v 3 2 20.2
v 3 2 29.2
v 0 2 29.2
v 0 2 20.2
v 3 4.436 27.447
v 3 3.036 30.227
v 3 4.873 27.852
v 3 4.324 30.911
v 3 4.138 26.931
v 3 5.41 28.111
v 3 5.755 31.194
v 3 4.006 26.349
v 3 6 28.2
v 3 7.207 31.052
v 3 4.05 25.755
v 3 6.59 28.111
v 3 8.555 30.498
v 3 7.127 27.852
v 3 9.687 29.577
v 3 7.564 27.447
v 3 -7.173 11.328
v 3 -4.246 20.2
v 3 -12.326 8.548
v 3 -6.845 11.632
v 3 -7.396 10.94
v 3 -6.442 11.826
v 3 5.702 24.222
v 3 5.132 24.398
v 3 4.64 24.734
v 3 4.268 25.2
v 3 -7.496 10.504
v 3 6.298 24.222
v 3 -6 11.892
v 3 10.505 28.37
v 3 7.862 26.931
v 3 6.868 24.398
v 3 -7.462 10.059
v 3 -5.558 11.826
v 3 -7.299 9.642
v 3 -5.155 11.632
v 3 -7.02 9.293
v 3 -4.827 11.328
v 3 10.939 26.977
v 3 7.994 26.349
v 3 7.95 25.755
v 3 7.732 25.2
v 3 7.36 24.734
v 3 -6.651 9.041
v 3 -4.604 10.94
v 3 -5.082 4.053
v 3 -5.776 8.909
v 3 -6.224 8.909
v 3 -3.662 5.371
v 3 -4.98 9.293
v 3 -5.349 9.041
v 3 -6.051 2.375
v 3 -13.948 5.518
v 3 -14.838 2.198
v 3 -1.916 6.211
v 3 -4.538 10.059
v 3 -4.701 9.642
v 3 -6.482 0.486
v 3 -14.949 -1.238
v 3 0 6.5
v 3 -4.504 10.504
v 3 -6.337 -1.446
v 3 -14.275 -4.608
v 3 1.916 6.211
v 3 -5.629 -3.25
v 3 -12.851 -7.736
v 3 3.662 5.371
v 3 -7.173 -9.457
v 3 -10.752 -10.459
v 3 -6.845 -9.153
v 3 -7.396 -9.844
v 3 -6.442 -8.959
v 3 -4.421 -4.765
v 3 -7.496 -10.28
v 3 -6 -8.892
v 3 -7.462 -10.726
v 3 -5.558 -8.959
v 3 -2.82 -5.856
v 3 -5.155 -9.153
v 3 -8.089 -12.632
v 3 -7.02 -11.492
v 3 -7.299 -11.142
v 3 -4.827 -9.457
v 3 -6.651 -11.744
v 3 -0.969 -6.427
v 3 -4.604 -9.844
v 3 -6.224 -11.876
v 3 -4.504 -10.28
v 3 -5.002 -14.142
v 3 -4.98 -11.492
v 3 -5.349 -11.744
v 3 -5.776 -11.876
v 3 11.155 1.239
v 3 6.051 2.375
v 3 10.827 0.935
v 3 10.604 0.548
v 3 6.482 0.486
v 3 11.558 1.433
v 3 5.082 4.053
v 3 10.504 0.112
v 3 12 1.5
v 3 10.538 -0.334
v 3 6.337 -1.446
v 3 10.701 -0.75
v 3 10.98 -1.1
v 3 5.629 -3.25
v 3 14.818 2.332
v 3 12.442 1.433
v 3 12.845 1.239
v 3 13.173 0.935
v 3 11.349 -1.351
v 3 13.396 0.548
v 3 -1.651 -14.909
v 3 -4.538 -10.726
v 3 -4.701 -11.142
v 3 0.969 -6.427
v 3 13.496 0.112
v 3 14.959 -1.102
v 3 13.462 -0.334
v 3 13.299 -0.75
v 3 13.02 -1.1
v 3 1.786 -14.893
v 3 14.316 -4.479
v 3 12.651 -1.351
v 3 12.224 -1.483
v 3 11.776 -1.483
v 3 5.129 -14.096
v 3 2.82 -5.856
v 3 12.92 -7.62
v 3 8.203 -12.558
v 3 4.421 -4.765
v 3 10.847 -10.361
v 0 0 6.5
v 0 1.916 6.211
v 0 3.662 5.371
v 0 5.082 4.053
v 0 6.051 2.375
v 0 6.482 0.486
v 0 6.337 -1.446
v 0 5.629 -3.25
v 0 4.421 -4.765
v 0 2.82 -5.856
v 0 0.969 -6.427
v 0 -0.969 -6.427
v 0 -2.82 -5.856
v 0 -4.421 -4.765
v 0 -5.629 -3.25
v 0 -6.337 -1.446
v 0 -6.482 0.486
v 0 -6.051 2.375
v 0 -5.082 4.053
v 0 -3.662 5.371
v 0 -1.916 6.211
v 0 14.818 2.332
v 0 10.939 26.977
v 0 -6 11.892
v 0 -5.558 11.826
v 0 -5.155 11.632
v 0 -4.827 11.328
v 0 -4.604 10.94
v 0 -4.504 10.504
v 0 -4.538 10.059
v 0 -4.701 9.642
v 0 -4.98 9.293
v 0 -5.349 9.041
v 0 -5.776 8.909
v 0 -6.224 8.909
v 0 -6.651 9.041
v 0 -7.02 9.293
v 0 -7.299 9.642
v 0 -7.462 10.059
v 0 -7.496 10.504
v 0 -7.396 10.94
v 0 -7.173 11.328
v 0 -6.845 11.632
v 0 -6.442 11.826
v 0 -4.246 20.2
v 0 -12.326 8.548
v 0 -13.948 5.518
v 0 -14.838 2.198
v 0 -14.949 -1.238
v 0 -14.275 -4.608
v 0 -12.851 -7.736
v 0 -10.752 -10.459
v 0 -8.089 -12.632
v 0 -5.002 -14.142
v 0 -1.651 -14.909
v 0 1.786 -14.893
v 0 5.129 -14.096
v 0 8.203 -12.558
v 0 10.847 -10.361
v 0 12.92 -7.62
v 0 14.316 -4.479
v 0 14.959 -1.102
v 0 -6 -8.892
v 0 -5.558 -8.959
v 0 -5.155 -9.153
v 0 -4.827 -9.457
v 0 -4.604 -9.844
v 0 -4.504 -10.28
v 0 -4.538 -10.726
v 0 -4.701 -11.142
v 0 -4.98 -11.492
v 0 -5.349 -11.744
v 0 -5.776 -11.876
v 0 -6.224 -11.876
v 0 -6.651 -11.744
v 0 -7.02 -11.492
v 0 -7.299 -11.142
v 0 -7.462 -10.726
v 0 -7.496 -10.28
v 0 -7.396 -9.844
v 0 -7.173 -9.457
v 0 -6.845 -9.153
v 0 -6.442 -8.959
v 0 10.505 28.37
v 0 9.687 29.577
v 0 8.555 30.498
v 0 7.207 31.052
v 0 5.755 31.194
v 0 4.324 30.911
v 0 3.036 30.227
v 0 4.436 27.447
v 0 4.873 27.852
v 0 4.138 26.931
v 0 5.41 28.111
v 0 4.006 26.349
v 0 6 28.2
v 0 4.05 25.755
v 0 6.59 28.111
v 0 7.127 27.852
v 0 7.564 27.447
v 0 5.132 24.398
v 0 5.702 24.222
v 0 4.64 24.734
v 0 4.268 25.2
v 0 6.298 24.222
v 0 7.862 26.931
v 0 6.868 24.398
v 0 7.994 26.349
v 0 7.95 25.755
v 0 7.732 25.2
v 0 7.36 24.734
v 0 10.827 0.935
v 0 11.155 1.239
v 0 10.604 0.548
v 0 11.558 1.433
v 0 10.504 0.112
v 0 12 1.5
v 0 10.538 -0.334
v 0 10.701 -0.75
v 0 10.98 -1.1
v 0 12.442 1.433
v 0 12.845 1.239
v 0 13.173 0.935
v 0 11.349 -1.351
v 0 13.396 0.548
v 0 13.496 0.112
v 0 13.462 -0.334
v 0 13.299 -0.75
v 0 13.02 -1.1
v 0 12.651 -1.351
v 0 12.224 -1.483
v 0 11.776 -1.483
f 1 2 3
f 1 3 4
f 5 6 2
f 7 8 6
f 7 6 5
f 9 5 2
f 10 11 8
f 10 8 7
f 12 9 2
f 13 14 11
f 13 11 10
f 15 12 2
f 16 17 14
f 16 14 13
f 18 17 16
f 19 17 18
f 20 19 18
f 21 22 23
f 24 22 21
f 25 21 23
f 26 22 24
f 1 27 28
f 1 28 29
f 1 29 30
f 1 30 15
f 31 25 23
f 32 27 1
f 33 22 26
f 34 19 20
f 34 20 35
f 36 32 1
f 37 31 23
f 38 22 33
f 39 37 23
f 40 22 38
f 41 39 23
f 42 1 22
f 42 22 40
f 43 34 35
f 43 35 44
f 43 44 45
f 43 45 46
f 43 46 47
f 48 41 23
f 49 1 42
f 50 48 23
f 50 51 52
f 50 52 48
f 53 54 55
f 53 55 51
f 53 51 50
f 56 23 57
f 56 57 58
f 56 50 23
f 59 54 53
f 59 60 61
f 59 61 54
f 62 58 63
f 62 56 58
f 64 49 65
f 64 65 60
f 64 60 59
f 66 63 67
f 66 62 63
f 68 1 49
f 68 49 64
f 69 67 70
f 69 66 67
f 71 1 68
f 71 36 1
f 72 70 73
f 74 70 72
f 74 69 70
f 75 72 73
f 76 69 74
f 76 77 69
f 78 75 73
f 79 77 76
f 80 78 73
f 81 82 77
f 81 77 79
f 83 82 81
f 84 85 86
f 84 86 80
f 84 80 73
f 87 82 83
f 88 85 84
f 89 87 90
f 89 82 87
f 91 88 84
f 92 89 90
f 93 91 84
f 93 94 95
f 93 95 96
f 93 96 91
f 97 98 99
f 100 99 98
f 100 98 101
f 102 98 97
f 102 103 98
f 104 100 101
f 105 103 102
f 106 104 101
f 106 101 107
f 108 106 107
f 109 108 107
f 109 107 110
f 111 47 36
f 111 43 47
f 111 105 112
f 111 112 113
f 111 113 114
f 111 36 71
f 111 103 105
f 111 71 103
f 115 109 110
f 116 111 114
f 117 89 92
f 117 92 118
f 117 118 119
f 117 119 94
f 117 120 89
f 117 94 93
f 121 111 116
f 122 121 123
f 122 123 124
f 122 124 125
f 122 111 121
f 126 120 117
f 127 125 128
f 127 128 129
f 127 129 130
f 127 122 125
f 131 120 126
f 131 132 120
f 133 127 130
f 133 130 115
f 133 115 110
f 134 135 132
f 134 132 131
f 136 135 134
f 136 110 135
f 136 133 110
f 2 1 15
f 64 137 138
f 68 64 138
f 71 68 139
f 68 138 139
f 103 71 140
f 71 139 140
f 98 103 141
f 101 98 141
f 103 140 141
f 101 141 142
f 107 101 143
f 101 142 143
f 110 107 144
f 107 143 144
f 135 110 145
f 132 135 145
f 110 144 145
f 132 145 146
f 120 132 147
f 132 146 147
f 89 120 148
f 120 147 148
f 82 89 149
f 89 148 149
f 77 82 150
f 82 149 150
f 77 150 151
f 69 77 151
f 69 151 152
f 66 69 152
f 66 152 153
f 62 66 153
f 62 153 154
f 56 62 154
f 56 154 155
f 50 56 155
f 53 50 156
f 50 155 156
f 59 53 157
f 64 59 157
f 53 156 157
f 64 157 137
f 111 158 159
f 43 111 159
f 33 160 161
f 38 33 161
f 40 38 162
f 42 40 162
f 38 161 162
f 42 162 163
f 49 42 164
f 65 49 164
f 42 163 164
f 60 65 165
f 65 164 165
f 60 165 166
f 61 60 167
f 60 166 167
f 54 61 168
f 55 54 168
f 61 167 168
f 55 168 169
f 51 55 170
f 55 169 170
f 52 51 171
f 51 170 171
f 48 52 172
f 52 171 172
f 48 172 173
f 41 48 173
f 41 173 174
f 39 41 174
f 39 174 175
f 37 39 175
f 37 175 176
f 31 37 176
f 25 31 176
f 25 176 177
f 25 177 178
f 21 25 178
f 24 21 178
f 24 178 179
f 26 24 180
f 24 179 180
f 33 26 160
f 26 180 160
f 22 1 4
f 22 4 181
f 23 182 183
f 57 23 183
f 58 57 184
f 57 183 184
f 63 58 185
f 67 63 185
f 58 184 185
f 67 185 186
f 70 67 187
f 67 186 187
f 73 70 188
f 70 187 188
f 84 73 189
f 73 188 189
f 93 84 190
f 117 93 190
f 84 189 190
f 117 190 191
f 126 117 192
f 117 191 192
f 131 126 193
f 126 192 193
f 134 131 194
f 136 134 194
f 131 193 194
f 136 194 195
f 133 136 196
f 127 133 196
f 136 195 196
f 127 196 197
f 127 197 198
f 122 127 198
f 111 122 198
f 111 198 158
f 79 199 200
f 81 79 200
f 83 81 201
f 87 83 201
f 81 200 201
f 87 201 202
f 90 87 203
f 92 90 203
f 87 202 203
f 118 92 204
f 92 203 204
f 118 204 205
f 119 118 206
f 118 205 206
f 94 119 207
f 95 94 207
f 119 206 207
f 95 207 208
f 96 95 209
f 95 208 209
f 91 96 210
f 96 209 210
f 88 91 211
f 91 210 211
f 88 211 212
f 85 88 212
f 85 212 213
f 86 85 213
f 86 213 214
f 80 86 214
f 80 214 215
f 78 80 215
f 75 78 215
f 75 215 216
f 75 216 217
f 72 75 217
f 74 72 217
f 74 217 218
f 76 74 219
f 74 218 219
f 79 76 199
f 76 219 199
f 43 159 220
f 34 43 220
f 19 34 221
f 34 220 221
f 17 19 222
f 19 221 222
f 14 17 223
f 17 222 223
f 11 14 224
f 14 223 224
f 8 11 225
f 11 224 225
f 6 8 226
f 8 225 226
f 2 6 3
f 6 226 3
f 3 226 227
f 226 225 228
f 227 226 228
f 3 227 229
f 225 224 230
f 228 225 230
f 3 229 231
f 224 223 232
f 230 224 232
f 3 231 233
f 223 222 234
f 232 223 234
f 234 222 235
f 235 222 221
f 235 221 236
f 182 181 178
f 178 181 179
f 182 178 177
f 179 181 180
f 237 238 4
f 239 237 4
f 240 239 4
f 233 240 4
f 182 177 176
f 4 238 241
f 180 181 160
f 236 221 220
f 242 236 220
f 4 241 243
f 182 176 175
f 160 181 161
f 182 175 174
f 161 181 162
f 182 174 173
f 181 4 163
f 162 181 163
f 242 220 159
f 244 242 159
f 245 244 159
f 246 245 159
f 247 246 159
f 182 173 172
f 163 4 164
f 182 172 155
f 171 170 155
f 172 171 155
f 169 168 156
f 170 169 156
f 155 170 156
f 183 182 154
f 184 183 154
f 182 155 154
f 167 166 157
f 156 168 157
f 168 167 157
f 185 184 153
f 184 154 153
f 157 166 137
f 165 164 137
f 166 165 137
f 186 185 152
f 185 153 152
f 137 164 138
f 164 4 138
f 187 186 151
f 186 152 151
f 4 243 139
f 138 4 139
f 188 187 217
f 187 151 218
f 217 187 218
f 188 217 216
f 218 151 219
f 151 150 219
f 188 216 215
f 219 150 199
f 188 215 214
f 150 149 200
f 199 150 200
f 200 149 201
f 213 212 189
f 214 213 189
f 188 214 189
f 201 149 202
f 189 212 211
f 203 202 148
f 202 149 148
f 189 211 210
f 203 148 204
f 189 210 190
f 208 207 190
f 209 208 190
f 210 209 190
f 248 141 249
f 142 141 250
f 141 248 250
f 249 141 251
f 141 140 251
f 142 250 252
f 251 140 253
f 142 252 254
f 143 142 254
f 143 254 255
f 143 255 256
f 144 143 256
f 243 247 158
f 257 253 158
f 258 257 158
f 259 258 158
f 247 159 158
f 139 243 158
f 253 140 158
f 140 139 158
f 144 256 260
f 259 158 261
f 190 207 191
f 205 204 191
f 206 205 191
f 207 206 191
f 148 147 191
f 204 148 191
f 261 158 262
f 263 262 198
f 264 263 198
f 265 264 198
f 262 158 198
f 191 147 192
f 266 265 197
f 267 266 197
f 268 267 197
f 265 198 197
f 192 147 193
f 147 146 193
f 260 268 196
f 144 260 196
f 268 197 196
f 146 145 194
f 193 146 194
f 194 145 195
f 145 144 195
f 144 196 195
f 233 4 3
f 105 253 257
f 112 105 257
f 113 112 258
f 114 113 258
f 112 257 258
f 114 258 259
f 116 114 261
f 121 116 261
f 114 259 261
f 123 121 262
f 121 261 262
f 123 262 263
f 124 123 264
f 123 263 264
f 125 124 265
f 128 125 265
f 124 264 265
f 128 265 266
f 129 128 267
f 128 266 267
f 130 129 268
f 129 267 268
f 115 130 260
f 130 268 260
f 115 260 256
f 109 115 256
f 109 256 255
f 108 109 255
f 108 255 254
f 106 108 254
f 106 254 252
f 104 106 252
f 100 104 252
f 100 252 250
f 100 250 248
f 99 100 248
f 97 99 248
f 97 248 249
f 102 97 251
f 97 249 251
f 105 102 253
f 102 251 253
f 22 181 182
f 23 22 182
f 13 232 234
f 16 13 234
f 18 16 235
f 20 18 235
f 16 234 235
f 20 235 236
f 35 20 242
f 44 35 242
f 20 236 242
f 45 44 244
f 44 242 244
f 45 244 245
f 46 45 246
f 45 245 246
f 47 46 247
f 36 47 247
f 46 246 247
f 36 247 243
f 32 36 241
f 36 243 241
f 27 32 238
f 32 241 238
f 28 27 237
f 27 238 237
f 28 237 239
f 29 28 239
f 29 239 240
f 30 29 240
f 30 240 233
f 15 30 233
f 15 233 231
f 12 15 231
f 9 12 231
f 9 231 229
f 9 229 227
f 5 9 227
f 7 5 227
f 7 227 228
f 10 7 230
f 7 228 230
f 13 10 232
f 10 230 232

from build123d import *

# Parameters (mm, degrees)
ESQUISSE1_R             = 6.5
ESQUISSE1_R_2           = 1.5
ESQUISSE1_R_3           = 2
BOSS_EXTRU_1_DEPTH      = 3
ENL_V_MAT_EXTRU_1_DEPTH = 4


with BuildPart() as part:
    # Esquisse1 → Boss.-Extru.1 (new body)
    with BuildSketch(Plane.ZY):
        with BuildLine():
            Line((29.049319561, 1.891304582), (8.547958684, -12.326086254))
            ThreePointArc((8.547958684, -12.326086254), (-14.621490903, -3.348433031), (2.331837562, 14.817642646))
            Line((2.331837562, 14.817642646), (26.977279187, 10.939214215))
            ThreePointArc((26.977279187, 10.939214215), (31.073830301, 7.116144344), (29.049319561, 1.891304582))
        make_face()
        Circle(ESQUISSE1_R, mode=Mode.SUBTRACT)
        with Locations((-10.392304845, -6)):
            Circle(ESQUISSE1_R_2, mode=Mode.SUBTRACT)
        with Locations((0, 12)):
            Circle(ESQUISSE1_R_2, mode=Mode.SUBTRACT)
        with Locations((10.392304845, -6)):
            Circle(ESQUISSE1_R_2, mode=Mode.SUBTRACT)
        with Locations((26.2, 6)):
            Circle(ESQUISSE1_R_3, mode=Mode.SUBTRACT)
    extrude(amount=-BOSS_EXTRU_1_DEPTH)

    # Esquisse2 → Enlèv. mat.-Extru.1 (cut, through all)
    with BuildSketch(Plane(origin=(3, 0, 0), x_dir=(0, 0, -1), z_dir=(1, 0, 0))):
        Polygon((-29.206057462, 2), (-20.2, 2), (-20.2, -4.245567774), align=None)
    extrude(amount=-ENL_V_MAT_EXTRU_1_DEPTH, mode=Mode.SUBTRACT)


solid = part.part
